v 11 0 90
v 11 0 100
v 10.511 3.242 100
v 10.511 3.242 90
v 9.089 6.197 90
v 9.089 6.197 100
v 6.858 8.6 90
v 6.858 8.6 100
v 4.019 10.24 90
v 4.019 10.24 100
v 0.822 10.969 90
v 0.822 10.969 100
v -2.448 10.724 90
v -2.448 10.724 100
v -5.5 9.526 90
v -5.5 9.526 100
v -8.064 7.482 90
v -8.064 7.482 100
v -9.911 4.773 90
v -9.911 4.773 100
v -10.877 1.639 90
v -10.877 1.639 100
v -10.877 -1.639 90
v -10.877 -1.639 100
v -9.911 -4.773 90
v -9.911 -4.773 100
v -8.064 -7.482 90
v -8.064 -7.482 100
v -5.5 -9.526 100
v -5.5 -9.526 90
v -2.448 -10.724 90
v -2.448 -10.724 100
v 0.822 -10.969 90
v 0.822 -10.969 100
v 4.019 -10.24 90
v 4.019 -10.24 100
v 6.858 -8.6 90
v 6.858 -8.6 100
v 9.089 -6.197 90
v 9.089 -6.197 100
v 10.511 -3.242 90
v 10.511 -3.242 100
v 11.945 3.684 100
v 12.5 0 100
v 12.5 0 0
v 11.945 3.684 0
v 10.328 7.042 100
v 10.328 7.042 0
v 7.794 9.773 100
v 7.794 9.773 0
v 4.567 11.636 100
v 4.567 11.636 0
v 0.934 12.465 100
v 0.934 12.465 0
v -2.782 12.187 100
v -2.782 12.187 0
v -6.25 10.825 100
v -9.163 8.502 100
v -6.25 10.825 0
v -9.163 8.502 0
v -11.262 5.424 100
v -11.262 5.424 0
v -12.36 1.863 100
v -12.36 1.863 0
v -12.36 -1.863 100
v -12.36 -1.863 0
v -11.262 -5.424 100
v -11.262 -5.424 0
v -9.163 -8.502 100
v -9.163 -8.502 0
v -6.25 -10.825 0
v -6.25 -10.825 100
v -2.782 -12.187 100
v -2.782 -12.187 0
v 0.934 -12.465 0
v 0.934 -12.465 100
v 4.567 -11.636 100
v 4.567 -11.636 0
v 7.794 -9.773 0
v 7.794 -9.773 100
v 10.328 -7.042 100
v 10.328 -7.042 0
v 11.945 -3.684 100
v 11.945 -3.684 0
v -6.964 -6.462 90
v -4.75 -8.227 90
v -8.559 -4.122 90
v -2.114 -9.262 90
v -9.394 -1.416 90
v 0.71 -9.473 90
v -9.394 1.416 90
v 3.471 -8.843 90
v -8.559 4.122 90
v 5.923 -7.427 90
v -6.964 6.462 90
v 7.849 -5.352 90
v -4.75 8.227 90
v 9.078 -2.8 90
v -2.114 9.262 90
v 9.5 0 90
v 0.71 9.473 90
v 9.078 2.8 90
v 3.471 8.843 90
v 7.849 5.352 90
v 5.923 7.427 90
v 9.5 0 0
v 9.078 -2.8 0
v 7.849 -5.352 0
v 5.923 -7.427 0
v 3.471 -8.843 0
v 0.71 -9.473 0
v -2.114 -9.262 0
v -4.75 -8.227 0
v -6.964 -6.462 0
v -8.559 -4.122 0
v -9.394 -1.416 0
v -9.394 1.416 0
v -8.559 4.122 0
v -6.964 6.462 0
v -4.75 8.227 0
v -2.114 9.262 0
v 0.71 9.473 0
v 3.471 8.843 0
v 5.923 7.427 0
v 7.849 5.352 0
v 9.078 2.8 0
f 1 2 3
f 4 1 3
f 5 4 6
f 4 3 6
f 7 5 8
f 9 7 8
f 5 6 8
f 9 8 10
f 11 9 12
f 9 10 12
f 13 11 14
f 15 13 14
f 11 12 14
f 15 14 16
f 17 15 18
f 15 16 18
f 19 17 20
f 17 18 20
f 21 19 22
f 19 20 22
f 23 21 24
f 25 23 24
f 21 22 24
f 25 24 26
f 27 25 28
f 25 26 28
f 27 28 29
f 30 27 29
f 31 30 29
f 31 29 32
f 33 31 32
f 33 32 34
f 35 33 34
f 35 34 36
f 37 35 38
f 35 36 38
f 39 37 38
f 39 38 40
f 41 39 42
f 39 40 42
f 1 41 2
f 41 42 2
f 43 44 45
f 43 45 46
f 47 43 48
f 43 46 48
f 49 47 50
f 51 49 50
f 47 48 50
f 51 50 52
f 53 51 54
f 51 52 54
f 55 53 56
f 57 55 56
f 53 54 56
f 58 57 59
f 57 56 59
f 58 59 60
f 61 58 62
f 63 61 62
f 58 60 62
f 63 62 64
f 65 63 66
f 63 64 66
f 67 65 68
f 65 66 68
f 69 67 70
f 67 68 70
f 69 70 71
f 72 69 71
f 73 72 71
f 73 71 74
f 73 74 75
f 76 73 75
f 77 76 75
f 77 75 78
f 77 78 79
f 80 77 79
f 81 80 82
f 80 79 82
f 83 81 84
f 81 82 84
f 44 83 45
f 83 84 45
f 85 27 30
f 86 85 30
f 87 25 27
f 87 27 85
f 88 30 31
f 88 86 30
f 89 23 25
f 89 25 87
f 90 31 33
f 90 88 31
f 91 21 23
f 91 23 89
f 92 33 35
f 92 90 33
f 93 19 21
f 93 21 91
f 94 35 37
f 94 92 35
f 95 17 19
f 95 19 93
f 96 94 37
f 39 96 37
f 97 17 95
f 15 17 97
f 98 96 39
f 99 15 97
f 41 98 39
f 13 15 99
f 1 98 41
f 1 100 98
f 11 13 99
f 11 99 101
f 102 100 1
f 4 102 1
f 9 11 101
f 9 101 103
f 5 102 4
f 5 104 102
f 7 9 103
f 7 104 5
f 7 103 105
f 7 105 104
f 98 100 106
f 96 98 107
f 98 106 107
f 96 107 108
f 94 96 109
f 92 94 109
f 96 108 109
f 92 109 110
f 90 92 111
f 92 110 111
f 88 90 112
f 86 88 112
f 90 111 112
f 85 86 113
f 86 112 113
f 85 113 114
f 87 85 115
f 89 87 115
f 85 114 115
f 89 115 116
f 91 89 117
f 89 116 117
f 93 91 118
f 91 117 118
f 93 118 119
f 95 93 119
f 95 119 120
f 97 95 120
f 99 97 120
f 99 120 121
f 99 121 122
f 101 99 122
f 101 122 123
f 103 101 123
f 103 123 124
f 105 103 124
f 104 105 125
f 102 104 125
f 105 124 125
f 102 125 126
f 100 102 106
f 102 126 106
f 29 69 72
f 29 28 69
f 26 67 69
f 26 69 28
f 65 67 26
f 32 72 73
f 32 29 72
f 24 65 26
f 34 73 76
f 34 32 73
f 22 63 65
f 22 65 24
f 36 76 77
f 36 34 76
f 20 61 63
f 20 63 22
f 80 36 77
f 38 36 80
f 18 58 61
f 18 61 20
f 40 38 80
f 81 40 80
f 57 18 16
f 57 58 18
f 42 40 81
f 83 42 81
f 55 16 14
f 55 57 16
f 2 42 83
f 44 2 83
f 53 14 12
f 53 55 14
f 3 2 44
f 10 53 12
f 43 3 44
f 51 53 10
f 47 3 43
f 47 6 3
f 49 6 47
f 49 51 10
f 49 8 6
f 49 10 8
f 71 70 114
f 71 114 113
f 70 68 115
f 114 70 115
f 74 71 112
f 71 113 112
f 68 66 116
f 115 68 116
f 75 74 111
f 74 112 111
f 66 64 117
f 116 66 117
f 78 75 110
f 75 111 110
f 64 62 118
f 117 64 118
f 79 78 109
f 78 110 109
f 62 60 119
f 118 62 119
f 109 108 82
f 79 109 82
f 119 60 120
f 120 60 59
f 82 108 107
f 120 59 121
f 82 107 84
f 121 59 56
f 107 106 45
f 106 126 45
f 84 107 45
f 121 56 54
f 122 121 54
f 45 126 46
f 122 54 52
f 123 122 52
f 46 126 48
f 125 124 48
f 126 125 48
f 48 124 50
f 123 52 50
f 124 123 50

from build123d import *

# Parameters (mm, degrees)
F0_R          = 12.5
F1_DEPTH      = 100
F2_R          = 9.5
F3_DEPTH      = 90
F3_DEPTH_BACK = 101.346
F4_R          = 11
F5_DEPTH      = 10
F5_DEPTH_BACK = 25.4


with BuildPart() as f1:
    # F0 (on Top) → F1 (new body)
    with BuildSketch(Plane.XY):
        Circle(F0_R)
    extrude(amount=F1_DEPTH)

    # F2 (on face) → F3 (cut, two sides)
    with BuildSketch(Plane(origin=(0, 0, 0), x_dir=(1, 0, 0), z_dir=(0, 0, -1))) as f3_sk:
        Circle(F2_R)
    extrude(amount=-F3_DEPTH, mode=Mode.SUBTRACT)
    extrude(f3_sk.sketch, amount=F3_DEPTH_BACK, mode=Mode.SUBTRACT)

    # F4 (on face) → F5 (cut, two sides)
    with BuildSketch(Plane.XY.offset(100)) as f5_sk:
        Circle(F4_R)
    extrude(amount=-F5_DEPTH, mode=Mode.SUBTRACT)
    extrude(f5_sk.sketch, amount=F5_DEPTH_BACK, mode=Mode.SUBTRACT)


solid = f1.part
